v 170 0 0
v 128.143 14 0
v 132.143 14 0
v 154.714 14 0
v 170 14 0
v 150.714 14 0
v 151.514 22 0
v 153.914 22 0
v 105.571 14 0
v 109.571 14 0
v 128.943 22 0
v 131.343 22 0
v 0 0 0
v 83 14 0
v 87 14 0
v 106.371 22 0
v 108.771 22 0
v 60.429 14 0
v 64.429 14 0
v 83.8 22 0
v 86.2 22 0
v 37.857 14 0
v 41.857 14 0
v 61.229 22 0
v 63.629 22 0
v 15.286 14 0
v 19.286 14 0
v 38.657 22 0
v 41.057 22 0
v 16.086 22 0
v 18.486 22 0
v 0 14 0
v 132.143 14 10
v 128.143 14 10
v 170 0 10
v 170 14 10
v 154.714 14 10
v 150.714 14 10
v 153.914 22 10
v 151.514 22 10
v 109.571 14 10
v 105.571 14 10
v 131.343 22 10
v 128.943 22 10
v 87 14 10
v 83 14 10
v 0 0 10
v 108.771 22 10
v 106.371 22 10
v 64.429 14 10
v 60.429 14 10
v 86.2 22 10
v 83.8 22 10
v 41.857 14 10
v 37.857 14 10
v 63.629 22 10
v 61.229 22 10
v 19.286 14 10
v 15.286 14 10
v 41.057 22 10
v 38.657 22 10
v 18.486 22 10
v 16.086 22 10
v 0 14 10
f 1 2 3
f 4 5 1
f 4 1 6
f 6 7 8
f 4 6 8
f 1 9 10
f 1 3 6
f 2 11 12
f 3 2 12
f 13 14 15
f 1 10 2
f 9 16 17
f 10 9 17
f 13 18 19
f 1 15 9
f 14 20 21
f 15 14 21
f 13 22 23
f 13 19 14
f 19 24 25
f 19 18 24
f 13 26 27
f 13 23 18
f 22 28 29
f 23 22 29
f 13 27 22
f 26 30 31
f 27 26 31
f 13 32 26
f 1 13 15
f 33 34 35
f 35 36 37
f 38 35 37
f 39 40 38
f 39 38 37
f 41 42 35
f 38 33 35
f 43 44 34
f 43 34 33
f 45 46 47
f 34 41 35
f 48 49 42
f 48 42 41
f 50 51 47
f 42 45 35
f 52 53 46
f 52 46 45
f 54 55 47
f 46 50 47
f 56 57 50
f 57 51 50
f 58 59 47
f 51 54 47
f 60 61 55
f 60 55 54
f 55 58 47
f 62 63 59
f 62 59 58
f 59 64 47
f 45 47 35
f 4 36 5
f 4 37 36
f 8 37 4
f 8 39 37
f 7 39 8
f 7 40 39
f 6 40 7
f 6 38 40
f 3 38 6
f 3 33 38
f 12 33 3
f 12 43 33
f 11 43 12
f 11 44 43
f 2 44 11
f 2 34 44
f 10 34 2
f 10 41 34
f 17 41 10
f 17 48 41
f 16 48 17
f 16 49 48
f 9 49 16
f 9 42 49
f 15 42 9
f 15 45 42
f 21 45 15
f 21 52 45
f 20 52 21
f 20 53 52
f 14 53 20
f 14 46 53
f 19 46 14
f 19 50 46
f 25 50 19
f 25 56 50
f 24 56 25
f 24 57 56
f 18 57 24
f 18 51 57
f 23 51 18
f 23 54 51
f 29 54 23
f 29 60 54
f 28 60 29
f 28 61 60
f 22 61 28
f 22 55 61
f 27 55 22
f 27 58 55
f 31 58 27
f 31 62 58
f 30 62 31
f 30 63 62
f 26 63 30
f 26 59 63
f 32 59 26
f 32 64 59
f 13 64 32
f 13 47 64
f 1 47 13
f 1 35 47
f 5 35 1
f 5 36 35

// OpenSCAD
$fn = 32;

// ----------------------------------------------------------------------
// Gear rack: 7 teeth on a 170 mm bar, pitch 22.57 mm
// ----------------------------------------------------------------------

// --- parameters (mm) ---
profile_height = 10;      // extrusion height
profile_points = 32;      // points of the closed outline

profile = [[0, 0], [170, 0], [170, 14], [154.714, 14], [153.914, 22], [151.514, 22], [150.714, 14], [132.143, 14], [131.343, 22], [128.943, 22], [128.143, 14], [109.571, 14], [108.771, 22], [106.371, 22], [105.571, 14], [87, 14], [86.2, 22], [83.8, 22], [83, 14], [64.429, 14], [63.629, 22], [61.229, 22], [60.429, 14], [41.857, 14], [41.057, 22], [38.657, 22], [37.857, 14], [19.286, 14], [18.486, 22], [16.086, 22], [15.286, 14], [0, 14]];  // single closed polygon, 32 points, counter clockwise

// --- the one profile operation ---
linear_extrude(height = profile_height) polygon(points = profile);
